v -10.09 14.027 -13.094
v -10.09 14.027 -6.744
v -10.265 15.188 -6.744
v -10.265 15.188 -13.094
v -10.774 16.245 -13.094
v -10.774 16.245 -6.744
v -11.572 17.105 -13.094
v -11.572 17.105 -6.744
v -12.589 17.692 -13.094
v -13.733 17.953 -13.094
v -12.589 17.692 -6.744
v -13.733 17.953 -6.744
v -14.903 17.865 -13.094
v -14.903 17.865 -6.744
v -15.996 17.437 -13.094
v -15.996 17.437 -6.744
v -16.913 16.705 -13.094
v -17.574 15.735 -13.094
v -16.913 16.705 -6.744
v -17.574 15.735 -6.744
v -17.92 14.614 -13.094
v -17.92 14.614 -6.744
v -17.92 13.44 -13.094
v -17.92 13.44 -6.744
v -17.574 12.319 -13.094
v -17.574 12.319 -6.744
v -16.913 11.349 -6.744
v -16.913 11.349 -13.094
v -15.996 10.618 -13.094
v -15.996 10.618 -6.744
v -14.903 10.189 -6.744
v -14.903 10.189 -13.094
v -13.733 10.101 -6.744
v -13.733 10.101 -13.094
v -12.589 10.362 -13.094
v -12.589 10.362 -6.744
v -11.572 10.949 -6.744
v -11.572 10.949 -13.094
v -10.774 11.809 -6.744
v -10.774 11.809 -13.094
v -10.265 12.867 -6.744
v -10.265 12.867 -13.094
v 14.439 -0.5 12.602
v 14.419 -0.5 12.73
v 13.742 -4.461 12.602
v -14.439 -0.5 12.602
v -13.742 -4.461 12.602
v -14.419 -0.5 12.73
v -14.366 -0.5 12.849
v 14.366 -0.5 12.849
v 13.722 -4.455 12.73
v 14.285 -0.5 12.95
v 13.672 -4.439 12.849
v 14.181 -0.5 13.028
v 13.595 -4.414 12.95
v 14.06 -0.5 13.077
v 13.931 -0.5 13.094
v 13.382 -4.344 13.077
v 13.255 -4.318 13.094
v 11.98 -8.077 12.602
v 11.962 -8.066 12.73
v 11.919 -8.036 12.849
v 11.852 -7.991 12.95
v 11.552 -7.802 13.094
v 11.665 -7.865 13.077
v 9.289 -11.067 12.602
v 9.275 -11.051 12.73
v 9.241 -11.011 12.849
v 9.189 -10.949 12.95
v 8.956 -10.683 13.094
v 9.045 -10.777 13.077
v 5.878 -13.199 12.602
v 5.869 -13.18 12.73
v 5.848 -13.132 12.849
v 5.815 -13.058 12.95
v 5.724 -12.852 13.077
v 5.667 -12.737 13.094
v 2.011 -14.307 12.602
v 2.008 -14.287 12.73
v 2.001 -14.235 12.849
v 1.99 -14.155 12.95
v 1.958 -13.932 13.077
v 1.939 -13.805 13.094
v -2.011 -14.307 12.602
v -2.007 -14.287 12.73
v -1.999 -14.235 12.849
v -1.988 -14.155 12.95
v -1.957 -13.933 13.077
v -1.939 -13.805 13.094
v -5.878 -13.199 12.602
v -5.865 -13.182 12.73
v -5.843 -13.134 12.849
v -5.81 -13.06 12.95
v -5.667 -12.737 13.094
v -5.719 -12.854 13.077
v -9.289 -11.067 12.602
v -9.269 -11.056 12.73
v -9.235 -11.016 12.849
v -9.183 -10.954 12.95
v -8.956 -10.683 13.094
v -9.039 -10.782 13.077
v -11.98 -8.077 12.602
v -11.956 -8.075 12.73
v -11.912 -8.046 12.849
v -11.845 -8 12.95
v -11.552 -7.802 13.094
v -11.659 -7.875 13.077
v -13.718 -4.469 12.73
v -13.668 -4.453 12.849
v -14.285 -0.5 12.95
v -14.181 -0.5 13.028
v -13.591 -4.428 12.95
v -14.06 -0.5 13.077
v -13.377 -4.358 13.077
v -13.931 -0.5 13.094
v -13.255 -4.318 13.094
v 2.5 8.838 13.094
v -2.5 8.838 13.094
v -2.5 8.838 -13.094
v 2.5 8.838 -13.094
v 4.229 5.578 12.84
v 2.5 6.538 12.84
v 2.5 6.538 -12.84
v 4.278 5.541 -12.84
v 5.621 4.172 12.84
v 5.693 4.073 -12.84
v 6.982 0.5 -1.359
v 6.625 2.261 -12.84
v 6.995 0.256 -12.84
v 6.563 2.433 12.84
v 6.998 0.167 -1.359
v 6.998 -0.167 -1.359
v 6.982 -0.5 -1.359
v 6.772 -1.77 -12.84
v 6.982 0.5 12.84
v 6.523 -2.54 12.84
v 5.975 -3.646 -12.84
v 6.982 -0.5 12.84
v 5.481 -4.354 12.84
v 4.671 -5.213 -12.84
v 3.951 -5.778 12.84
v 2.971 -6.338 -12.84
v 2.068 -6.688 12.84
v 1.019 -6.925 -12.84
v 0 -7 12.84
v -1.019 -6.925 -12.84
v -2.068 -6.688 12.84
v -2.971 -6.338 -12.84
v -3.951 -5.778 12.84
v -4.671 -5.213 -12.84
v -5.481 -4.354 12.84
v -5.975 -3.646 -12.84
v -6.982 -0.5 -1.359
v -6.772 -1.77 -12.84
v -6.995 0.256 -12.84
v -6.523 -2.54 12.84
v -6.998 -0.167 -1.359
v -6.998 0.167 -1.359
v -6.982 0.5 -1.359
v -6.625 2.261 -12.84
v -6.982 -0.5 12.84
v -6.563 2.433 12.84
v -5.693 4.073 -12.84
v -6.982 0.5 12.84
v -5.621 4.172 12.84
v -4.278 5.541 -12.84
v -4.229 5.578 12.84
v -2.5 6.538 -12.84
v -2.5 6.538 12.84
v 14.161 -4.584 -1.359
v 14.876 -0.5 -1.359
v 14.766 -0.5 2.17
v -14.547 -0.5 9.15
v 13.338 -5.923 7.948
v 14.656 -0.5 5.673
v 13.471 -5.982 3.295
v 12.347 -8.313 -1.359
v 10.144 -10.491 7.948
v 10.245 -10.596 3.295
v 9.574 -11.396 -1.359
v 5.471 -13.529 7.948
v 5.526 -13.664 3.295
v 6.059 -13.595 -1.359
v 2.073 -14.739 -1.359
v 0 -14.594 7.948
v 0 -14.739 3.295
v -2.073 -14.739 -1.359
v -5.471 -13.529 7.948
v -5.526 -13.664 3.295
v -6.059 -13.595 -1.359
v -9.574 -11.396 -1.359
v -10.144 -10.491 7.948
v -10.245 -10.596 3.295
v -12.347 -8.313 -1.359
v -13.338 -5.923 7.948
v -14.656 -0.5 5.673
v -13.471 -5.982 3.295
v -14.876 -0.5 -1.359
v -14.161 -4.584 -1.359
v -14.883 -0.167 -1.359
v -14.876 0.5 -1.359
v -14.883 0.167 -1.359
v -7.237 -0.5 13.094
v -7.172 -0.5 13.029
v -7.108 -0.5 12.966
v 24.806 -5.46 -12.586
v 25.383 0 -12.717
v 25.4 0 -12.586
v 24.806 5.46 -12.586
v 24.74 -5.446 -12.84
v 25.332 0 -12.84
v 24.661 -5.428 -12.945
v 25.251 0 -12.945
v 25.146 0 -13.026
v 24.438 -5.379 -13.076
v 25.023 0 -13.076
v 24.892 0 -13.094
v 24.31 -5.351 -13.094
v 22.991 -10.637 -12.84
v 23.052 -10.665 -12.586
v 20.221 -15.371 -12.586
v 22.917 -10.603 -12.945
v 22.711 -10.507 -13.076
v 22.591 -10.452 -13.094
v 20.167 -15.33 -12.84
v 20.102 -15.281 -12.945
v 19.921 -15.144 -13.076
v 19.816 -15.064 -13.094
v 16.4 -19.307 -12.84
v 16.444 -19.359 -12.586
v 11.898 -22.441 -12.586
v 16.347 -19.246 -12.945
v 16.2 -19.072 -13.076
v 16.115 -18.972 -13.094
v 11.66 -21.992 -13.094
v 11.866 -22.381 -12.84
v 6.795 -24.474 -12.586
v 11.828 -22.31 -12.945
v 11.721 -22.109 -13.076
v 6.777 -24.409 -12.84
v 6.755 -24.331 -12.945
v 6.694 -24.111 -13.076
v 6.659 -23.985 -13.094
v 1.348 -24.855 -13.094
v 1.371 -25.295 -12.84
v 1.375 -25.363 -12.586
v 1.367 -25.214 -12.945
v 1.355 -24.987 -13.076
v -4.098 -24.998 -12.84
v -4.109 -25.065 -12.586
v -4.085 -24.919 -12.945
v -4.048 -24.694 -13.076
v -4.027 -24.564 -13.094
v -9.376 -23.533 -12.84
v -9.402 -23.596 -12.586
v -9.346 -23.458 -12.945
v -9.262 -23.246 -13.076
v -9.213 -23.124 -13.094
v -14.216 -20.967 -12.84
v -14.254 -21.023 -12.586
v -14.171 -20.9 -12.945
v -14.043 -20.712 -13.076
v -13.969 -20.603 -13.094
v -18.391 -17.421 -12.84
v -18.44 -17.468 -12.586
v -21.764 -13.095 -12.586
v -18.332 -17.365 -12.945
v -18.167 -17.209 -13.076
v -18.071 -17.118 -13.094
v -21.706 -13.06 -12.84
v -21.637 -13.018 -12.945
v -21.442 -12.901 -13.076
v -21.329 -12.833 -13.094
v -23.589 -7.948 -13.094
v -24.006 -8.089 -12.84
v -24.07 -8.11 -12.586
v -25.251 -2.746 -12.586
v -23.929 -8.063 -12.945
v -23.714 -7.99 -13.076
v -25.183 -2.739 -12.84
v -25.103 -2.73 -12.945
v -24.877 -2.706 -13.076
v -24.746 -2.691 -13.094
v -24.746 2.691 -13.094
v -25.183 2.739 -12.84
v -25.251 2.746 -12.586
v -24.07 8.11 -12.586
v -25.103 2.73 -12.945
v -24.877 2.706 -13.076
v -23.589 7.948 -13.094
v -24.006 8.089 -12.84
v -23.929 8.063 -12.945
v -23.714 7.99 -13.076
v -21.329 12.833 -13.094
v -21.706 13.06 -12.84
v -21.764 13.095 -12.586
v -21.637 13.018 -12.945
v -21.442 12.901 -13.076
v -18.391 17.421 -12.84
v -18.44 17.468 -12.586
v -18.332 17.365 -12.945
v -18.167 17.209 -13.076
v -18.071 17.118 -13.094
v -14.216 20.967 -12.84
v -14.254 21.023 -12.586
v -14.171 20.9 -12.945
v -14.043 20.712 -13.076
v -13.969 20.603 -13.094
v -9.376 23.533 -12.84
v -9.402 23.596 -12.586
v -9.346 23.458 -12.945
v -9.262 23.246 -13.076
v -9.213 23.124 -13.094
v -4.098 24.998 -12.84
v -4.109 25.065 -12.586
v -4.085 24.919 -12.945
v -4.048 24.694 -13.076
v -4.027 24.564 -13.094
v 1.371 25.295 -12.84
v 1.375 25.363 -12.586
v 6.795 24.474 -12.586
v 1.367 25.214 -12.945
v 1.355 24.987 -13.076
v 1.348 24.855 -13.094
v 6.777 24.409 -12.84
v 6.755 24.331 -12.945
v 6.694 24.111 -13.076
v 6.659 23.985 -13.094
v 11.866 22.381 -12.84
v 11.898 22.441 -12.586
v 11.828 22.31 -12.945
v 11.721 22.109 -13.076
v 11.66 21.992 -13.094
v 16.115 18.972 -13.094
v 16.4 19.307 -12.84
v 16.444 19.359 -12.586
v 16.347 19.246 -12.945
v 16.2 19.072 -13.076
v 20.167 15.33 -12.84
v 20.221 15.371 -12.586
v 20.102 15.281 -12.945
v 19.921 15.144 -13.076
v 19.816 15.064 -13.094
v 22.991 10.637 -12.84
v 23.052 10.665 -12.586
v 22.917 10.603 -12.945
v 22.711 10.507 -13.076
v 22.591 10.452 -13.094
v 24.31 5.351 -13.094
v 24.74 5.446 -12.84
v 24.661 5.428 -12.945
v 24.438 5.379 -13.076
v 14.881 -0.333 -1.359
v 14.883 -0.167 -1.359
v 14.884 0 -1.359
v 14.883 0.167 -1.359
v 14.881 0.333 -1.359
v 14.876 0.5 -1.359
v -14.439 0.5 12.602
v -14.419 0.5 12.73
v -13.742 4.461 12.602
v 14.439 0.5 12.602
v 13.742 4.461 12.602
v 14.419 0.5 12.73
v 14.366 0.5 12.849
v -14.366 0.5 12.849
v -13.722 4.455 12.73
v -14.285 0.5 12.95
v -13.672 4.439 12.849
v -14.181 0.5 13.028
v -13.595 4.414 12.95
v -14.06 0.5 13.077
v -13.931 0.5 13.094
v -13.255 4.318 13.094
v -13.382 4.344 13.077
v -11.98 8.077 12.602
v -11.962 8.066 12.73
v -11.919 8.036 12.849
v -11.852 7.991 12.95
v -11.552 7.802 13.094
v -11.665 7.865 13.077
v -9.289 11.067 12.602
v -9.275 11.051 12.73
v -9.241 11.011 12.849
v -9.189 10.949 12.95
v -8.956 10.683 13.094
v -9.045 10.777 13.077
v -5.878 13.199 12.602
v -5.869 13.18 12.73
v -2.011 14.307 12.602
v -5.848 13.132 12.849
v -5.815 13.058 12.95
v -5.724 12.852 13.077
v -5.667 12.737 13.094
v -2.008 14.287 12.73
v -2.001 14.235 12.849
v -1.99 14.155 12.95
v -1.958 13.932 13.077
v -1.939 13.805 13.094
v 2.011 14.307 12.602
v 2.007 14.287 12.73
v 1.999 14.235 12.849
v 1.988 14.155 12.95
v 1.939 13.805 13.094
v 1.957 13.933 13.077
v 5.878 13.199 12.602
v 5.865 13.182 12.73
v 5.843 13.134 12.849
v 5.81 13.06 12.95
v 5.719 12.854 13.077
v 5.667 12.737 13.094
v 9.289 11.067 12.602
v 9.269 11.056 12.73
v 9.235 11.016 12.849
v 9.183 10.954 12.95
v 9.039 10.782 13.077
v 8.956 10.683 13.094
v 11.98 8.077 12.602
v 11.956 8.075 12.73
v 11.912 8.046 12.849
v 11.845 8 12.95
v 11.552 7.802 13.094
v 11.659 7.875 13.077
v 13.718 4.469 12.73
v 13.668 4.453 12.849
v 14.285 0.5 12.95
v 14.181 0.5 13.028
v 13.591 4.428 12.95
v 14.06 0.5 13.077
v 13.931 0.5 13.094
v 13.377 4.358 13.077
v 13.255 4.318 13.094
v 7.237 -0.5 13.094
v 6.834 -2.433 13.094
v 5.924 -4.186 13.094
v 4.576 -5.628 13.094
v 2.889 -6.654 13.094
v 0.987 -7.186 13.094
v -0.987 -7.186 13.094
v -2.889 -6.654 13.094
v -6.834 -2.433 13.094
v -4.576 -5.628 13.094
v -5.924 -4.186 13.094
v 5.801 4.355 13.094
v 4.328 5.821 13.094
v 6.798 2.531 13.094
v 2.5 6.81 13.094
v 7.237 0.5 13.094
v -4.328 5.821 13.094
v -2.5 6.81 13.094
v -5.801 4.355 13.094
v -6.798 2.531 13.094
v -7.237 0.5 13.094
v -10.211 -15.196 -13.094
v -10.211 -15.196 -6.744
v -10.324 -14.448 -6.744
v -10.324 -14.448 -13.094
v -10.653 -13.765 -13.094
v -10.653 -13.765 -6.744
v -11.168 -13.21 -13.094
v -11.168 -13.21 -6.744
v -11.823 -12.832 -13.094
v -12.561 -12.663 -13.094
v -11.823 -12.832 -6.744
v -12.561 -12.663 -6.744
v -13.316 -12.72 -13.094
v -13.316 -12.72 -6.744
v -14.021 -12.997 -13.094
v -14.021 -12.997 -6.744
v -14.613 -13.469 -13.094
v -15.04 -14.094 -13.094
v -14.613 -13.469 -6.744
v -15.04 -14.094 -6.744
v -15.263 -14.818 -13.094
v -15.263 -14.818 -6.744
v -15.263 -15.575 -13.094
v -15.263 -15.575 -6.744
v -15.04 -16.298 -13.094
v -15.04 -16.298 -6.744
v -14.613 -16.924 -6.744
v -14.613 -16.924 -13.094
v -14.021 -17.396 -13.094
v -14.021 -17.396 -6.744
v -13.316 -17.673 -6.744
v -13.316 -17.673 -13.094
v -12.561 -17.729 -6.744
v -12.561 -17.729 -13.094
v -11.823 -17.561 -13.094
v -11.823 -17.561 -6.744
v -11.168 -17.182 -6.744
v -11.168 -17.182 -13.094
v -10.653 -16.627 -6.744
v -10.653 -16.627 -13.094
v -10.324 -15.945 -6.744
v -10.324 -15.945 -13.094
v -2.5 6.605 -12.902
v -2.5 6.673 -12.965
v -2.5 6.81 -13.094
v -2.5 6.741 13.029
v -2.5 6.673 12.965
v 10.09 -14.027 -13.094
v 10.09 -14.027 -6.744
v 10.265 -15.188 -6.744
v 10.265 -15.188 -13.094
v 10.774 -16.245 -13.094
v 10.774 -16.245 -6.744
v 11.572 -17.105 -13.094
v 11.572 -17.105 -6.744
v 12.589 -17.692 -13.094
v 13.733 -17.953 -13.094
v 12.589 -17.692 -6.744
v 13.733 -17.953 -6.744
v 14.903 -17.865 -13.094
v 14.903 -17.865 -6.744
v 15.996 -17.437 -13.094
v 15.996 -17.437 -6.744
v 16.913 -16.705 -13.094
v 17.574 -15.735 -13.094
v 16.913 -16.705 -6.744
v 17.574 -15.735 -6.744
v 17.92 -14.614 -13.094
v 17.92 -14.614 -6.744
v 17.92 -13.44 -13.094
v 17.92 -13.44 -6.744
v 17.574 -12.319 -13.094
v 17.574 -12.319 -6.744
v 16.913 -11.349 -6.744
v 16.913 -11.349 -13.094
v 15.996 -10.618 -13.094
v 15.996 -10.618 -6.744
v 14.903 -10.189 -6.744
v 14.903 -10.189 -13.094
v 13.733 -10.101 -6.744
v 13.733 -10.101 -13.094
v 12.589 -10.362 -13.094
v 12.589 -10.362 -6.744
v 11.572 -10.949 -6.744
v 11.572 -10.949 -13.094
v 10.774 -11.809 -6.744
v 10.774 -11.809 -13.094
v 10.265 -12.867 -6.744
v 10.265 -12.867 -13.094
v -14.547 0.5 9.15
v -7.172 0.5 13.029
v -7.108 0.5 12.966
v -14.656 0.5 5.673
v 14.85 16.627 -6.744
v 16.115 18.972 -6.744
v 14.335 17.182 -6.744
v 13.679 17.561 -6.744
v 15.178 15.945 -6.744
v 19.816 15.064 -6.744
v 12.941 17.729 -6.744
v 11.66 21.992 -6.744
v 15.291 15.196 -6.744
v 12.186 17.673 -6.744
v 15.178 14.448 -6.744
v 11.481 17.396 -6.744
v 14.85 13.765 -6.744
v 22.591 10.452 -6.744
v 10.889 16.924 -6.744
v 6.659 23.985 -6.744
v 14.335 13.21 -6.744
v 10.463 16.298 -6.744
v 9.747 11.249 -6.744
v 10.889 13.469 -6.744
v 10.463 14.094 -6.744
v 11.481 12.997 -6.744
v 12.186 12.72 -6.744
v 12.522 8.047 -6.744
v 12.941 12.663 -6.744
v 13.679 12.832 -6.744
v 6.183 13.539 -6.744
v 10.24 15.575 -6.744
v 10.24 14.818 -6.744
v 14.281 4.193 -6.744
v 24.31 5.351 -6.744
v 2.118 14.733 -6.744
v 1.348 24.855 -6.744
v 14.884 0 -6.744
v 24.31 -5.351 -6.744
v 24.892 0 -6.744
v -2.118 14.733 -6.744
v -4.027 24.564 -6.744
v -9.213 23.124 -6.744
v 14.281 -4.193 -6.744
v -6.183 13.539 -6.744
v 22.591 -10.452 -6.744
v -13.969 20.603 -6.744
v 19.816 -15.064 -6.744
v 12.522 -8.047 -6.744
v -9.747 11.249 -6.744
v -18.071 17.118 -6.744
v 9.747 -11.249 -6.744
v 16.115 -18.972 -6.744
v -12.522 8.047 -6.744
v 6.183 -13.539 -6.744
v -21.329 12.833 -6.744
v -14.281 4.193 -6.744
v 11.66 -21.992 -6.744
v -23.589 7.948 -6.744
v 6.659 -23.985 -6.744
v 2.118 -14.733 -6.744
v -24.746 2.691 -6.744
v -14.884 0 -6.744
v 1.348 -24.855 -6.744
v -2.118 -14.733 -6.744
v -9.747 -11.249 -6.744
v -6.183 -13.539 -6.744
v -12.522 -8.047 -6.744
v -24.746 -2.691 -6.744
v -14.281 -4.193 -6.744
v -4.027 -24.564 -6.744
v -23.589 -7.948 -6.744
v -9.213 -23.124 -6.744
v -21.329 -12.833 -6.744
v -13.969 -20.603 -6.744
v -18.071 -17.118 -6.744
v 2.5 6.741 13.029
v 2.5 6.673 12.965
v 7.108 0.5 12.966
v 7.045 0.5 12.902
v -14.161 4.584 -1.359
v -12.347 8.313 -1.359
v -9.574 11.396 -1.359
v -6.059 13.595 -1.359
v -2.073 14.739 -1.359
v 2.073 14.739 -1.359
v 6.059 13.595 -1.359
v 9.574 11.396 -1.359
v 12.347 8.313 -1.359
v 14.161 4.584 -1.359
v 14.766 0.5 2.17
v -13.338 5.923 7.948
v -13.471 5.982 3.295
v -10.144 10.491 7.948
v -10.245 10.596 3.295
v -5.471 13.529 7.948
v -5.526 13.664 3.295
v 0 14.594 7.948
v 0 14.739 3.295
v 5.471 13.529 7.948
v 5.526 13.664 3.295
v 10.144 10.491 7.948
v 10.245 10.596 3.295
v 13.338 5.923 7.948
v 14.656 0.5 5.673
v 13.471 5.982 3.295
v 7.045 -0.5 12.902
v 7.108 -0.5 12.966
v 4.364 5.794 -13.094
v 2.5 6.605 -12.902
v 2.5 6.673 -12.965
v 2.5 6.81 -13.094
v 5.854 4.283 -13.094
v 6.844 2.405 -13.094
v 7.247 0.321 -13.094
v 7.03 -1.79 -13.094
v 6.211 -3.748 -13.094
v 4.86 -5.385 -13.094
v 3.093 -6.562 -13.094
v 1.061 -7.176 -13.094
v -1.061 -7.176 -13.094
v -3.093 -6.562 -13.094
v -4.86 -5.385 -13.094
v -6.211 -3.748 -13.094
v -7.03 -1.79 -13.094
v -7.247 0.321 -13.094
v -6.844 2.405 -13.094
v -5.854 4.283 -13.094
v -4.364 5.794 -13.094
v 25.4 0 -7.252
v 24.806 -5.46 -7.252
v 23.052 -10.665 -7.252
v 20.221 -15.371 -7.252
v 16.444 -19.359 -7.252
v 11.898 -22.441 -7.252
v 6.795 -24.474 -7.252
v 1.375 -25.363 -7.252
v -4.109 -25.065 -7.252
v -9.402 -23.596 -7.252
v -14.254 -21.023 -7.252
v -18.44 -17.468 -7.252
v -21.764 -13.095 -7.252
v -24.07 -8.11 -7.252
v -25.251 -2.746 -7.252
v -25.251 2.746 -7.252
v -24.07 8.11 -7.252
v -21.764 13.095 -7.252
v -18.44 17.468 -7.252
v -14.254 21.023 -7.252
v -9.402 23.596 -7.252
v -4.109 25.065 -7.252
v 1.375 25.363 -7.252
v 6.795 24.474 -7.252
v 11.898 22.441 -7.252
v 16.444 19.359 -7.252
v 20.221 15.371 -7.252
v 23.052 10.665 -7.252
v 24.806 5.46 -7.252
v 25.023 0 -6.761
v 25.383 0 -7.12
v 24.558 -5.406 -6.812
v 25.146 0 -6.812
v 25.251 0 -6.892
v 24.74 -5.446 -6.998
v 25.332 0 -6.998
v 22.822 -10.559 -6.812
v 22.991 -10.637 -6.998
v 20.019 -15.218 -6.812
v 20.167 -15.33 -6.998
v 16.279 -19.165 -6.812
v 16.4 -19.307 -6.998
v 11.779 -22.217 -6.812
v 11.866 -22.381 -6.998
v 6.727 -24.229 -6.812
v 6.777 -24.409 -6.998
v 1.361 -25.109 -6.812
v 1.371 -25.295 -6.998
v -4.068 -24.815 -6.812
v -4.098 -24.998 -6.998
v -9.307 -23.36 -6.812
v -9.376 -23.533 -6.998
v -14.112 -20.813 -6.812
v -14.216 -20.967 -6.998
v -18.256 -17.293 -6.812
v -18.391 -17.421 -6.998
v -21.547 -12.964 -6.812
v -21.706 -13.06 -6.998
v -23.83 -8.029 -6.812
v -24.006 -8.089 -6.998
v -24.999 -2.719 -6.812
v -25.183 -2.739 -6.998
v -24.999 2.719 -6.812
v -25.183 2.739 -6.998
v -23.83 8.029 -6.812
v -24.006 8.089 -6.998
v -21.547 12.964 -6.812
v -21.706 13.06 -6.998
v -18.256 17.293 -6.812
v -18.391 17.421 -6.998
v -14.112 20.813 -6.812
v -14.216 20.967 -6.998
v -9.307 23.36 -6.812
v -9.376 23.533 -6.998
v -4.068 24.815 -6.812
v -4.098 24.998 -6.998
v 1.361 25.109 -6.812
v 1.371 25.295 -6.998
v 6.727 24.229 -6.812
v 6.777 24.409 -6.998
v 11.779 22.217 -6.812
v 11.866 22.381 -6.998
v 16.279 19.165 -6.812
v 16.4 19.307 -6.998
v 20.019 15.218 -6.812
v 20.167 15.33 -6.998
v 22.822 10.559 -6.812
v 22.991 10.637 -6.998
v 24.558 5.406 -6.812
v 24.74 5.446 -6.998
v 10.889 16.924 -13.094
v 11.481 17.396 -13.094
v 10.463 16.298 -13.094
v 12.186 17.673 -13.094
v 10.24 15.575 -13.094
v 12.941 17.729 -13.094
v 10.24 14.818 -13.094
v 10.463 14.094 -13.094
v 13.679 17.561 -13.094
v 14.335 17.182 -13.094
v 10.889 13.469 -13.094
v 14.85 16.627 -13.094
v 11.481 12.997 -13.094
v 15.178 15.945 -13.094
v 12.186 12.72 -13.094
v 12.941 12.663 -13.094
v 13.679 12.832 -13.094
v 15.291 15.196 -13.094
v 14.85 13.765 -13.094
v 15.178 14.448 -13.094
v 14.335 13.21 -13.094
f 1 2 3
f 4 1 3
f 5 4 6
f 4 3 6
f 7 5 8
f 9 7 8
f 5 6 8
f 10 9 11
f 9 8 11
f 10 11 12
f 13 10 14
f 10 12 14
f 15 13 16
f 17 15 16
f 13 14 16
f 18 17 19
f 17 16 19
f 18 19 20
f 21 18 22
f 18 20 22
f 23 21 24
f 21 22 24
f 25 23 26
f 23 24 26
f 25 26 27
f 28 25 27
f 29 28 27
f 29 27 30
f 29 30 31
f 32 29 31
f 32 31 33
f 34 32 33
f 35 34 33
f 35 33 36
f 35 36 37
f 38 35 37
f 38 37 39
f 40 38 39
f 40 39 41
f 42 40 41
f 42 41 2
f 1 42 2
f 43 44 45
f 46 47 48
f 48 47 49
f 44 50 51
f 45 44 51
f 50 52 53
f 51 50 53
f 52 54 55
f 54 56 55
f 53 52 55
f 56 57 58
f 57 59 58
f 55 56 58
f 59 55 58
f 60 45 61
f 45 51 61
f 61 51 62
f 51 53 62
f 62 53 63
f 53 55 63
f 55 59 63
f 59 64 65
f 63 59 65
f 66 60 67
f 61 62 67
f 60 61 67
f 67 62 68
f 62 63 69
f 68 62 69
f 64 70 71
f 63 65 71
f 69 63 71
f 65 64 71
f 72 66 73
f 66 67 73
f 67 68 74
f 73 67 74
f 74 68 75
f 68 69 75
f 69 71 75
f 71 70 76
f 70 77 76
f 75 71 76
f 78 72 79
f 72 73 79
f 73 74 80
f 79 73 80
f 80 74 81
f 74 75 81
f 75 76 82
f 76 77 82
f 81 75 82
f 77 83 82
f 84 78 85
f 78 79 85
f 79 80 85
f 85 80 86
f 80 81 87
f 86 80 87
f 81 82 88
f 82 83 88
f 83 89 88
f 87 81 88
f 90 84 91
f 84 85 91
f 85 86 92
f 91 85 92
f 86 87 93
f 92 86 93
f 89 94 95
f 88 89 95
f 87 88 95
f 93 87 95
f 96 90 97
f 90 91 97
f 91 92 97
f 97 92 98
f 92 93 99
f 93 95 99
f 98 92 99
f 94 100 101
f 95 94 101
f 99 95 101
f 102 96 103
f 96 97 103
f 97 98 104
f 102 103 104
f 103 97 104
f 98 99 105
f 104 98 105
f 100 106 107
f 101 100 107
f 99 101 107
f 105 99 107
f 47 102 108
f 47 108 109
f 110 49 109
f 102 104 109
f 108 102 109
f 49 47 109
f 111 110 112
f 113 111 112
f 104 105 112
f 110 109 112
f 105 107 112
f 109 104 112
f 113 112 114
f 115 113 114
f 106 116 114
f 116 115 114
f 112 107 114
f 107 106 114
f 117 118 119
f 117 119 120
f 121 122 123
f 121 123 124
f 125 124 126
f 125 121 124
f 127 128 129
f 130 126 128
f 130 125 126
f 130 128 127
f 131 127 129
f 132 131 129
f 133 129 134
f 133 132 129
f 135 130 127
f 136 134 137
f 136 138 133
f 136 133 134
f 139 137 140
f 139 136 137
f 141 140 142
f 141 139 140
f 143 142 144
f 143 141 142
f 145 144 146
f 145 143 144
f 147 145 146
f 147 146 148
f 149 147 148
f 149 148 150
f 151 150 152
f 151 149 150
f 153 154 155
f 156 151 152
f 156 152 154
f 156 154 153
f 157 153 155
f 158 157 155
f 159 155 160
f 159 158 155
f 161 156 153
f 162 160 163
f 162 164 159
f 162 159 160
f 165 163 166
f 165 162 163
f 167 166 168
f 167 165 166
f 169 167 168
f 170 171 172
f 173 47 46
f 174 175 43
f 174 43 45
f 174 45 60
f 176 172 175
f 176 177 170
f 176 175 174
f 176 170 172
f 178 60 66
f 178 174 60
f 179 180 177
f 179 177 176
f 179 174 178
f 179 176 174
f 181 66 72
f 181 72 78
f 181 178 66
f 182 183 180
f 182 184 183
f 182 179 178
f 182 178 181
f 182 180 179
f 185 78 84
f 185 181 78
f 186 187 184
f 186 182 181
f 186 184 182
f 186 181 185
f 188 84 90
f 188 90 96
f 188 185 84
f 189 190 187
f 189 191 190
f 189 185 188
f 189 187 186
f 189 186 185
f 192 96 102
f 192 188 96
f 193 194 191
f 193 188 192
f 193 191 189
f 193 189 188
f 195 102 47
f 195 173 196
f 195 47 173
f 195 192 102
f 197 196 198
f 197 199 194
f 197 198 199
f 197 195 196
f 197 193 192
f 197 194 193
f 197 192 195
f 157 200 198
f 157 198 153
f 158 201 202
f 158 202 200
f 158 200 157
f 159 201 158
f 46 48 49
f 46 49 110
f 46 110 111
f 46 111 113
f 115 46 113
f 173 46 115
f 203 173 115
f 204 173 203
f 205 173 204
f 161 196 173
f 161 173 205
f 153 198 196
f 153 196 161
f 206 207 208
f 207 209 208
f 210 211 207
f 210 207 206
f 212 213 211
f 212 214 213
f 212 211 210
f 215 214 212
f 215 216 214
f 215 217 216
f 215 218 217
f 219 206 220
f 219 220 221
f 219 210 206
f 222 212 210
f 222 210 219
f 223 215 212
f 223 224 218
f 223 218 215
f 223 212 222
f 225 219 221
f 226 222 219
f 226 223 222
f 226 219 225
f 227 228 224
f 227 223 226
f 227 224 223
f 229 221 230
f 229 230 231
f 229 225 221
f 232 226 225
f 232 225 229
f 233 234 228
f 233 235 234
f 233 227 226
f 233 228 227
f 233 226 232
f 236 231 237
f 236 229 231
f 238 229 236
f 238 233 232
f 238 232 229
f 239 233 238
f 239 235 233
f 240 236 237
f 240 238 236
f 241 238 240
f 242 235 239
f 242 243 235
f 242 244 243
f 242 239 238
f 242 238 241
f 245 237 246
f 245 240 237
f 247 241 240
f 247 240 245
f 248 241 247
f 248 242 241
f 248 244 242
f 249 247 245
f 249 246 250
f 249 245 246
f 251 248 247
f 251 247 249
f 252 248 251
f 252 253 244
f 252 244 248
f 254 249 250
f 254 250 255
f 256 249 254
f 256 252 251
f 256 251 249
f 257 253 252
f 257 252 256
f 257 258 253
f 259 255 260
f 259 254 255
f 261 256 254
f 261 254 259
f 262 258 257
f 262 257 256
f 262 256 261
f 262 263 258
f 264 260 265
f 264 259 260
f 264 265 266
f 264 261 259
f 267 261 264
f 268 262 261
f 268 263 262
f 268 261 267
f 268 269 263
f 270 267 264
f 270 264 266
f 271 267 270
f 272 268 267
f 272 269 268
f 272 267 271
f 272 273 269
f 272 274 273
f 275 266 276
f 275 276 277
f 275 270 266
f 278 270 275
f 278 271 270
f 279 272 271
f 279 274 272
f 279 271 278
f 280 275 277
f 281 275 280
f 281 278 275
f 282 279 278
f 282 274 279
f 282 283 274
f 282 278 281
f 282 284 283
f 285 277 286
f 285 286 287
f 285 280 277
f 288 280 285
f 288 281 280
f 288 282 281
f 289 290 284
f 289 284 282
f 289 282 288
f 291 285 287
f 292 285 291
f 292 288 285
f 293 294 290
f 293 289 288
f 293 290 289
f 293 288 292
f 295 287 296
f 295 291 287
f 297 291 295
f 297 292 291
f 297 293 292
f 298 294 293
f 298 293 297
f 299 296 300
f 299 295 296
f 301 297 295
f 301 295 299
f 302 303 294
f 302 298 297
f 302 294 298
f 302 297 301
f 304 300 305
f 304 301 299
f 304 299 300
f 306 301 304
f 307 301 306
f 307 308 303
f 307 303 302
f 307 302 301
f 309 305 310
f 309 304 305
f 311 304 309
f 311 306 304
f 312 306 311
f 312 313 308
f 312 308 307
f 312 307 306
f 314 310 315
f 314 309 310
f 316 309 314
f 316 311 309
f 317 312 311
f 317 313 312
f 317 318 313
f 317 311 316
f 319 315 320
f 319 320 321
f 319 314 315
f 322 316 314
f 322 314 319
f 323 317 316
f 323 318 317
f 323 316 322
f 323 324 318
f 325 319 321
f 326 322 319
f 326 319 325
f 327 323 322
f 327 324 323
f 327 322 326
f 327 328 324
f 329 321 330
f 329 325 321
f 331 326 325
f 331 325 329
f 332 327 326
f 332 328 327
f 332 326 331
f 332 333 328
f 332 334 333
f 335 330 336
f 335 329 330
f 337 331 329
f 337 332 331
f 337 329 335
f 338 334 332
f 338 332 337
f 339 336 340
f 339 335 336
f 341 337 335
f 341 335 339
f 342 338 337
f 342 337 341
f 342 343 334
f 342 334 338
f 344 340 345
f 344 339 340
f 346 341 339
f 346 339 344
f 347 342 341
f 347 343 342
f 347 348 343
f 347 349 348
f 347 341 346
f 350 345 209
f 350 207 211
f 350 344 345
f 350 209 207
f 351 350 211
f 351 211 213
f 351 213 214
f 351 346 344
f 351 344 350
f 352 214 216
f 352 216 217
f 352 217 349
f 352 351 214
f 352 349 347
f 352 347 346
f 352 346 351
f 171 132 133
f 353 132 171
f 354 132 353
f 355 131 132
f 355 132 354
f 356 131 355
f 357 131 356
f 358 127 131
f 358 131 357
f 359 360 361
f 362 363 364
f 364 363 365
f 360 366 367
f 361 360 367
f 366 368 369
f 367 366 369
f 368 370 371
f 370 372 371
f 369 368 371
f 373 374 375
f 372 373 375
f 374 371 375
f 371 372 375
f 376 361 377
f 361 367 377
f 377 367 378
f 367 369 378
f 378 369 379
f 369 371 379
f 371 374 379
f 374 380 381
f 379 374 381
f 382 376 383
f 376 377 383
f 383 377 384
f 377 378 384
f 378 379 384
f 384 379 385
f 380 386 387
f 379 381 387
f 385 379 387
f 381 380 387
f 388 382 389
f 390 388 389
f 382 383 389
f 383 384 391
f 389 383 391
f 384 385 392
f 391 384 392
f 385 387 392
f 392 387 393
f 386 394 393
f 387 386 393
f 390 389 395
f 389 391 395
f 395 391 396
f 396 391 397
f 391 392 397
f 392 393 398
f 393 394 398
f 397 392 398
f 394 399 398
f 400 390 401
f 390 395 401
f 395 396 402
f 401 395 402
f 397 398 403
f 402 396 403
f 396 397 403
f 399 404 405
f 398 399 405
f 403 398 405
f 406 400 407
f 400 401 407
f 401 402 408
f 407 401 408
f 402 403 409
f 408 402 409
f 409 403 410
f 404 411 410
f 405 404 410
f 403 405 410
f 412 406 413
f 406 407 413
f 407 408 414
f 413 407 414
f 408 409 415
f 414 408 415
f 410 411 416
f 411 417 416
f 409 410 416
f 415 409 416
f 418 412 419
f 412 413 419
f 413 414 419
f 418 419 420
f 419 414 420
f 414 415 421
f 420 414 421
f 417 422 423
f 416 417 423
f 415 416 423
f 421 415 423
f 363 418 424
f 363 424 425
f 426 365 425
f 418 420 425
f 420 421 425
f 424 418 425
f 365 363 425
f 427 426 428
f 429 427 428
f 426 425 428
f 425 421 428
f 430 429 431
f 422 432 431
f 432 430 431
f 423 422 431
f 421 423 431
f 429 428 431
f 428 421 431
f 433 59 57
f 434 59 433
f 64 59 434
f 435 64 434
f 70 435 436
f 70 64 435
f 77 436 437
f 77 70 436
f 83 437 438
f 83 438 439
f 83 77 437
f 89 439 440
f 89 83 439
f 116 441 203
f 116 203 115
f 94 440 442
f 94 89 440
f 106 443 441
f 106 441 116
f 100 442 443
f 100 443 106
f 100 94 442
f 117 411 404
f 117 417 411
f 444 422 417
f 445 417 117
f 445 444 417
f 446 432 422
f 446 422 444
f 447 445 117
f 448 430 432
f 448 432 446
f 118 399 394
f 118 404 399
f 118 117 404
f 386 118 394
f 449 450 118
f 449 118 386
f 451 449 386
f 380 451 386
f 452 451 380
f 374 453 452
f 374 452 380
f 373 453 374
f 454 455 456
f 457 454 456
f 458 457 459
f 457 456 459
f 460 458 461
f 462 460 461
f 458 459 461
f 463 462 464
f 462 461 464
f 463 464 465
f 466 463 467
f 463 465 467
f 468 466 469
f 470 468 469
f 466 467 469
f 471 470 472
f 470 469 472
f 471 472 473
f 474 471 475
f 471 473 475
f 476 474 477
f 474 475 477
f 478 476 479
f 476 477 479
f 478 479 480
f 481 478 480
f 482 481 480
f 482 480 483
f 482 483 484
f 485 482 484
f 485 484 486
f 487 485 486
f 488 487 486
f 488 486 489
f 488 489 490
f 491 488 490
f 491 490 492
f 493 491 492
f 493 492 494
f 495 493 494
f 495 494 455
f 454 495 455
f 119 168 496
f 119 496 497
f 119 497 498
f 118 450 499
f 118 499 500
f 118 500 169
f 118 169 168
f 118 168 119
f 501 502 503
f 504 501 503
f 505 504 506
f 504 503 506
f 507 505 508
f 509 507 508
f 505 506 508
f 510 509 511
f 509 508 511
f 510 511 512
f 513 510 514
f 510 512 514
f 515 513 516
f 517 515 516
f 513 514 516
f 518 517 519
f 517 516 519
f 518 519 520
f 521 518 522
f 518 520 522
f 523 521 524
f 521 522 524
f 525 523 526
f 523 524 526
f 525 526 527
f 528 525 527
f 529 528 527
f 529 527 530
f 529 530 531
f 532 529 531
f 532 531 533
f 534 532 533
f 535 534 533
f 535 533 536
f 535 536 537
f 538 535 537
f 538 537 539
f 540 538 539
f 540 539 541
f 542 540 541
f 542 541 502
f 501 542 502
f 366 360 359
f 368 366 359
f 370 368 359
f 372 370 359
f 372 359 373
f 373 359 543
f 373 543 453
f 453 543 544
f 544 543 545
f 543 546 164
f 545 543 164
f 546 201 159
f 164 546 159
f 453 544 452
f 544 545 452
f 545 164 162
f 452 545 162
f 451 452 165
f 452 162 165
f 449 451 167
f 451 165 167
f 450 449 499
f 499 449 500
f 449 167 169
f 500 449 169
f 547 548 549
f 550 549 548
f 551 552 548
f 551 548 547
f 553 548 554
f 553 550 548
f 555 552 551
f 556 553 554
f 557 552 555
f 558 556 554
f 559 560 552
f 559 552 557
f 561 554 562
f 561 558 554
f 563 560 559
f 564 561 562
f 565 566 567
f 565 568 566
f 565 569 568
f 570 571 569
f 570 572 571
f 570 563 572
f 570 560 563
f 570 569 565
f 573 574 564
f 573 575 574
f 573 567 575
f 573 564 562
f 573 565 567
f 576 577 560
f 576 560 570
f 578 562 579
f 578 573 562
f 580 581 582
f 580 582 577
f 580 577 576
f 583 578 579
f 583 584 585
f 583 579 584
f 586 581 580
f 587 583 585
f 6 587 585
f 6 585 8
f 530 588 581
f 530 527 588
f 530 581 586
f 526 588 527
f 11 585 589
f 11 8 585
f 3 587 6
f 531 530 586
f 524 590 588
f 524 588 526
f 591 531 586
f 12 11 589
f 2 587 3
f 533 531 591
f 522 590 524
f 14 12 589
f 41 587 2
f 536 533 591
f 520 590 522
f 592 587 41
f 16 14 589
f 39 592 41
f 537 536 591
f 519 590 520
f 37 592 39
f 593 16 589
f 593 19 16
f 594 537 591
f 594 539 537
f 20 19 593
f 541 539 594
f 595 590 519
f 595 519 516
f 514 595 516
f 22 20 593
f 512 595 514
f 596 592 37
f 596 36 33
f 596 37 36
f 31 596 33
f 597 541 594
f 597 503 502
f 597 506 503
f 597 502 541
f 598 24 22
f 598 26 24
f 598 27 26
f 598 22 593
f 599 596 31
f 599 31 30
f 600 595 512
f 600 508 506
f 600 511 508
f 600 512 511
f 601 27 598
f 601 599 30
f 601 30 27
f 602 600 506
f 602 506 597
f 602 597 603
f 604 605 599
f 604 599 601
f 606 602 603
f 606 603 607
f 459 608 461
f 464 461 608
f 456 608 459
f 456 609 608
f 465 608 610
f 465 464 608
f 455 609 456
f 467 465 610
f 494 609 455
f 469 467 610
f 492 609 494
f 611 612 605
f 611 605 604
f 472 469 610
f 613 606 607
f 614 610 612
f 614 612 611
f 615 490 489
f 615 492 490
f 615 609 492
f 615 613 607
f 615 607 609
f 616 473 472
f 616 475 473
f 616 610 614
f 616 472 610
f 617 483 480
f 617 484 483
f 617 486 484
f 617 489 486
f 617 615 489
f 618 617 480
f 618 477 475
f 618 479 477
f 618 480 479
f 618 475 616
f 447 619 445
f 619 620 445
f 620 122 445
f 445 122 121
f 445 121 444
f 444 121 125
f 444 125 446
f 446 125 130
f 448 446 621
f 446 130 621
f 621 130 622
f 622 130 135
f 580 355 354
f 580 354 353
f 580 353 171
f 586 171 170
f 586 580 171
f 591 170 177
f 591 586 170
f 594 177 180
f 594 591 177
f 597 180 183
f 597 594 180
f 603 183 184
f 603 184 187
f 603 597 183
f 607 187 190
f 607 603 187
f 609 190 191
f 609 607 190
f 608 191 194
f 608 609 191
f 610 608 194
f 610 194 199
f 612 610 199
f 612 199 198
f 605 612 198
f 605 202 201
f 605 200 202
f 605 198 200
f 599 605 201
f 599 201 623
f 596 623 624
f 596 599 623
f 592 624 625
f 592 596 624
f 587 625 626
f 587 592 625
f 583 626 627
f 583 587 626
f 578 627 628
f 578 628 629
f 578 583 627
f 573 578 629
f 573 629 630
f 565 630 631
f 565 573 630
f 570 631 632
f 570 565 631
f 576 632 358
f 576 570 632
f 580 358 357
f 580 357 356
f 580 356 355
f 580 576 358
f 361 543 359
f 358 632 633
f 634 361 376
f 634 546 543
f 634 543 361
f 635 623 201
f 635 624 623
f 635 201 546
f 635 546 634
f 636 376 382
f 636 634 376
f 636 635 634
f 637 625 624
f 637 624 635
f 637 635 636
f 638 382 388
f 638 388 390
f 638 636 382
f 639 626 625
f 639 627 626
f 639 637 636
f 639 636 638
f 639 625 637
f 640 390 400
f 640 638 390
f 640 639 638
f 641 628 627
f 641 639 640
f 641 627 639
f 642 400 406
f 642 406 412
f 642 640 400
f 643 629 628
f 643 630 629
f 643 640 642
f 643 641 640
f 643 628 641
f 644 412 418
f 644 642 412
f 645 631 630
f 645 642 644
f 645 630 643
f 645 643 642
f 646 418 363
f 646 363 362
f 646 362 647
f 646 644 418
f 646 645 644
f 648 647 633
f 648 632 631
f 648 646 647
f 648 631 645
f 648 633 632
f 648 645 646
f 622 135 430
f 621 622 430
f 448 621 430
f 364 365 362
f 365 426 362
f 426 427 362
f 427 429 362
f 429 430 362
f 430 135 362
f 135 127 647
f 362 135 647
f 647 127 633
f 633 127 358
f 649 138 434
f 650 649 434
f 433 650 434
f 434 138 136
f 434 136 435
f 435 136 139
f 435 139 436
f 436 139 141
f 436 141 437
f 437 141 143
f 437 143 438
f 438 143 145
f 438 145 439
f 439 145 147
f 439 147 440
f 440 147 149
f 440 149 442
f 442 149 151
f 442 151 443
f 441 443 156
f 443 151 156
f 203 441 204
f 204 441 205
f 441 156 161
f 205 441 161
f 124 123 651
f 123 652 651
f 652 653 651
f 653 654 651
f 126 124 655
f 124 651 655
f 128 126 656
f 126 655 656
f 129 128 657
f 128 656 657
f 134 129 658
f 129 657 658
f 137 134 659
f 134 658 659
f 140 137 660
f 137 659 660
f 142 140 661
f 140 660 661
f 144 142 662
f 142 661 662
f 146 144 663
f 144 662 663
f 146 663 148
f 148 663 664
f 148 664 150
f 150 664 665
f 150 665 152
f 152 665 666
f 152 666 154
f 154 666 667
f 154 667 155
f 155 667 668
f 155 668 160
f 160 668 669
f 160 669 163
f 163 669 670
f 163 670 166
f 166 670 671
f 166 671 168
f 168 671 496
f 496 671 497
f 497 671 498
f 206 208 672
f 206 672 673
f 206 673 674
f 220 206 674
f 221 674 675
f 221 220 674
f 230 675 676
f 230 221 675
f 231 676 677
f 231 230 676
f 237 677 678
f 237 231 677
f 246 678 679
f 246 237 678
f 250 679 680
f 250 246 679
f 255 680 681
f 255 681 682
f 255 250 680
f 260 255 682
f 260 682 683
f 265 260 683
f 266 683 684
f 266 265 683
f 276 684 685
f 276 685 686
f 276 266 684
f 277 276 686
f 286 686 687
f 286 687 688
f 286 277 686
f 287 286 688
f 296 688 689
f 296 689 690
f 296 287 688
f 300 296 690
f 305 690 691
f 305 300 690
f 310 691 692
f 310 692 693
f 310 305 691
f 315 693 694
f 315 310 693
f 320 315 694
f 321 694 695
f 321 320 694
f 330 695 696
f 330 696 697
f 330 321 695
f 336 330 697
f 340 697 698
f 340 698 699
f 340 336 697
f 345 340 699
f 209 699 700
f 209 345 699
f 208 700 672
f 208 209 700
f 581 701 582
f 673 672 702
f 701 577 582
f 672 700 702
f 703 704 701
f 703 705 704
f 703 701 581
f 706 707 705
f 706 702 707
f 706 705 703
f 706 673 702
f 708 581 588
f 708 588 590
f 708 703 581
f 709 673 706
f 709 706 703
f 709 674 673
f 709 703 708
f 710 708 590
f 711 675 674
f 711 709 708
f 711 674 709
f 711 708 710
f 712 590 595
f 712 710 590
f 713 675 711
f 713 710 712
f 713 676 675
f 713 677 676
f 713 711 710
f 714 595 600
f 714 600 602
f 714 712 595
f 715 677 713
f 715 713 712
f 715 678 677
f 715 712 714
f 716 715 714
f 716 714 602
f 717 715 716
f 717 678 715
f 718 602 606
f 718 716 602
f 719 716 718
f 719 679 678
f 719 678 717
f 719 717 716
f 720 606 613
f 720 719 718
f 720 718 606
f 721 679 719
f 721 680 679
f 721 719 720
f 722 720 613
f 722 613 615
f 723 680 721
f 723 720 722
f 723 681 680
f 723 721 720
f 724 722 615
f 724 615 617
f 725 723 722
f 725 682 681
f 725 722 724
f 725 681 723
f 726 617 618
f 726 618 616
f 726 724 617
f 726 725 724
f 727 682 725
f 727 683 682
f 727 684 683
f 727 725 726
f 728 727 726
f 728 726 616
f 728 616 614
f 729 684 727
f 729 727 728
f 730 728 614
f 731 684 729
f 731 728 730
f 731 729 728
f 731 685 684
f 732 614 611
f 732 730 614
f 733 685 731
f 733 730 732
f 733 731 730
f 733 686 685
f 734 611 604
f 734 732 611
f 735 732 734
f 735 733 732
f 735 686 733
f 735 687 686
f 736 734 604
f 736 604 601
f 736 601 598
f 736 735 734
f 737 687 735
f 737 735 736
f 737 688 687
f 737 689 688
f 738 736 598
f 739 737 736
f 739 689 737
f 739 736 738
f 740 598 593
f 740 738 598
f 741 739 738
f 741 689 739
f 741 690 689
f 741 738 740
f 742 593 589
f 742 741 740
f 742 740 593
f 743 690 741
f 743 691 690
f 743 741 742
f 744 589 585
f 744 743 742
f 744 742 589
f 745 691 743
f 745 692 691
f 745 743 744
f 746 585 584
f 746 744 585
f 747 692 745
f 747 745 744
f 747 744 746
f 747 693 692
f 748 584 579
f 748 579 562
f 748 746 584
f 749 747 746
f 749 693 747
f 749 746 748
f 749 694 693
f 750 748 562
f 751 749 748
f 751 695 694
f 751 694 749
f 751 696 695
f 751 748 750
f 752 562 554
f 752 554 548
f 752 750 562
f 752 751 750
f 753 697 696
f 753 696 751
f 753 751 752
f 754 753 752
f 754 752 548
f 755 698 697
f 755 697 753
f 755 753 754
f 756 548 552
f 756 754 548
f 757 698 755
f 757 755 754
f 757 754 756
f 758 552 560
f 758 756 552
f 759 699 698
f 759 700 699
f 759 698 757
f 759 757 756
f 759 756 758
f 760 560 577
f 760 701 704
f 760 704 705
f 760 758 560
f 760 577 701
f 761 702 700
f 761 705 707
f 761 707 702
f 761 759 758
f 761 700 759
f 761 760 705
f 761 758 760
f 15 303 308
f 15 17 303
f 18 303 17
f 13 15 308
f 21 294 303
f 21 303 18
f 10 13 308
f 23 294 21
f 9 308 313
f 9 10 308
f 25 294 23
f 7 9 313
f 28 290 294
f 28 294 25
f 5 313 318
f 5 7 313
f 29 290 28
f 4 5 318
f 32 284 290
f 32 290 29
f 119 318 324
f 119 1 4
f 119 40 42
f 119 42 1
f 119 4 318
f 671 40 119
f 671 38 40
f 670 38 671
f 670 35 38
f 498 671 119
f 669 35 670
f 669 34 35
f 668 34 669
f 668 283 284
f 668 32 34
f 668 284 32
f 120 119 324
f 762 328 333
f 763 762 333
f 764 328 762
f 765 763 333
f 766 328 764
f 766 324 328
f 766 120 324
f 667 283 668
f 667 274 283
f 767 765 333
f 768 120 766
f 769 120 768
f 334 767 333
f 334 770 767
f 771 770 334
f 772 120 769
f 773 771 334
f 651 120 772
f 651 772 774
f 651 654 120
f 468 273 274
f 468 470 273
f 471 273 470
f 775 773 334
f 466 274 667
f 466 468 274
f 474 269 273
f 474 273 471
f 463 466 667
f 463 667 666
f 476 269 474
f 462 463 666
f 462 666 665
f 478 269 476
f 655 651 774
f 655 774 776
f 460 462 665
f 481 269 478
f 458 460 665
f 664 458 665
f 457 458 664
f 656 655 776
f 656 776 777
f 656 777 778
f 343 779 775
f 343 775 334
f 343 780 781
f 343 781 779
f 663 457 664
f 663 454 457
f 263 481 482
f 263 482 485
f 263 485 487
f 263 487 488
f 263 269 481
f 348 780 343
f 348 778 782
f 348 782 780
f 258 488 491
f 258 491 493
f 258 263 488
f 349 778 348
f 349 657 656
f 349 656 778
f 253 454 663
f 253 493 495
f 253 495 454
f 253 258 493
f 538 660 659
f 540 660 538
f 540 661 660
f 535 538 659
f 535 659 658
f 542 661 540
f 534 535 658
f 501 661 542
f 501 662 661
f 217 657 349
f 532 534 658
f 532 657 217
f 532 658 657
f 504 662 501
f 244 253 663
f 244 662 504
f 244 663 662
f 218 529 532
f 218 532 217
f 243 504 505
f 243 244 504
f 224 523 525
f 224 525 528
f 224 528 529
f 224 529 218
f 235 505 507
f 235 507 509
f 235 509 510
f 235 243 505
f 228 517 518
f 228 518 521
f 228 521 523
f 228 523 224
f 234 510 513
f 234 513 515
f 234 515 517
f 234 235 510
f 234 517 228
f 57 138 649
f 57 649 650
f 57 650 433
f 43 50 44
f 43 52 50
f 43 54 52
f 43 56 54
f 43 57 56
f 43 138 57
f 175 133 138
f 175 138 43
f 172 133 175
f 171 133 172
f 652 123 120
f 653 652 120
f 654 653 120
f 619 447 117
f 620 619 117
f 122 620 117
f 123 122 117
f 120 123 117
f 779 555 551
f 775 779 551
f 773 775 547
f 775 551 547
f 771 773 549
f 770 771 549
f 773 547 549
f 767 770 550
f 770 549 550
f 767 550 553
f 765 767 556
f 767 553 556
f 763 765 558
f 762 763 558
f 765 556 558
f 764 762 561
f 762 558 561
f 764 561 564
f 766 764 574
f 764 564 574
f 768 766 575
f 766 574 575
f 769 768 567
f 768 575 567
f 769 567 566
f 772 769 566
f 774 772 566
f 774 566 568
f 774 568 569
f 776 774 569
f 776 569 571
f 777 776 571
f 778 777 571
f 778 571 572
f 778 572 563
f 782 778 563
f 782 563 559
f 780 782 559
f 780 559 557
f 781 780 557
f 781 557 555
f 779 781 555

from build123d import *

# Parameters (mm, degrees)
FILLET1_R                        = 0.508
FILLET2_R                        = 0.508
CHAMFER1_SIZE                    = 0.254
SKETCH19_R                       = 2.54
THREADED_HOLES_1_DEPTH           = 42.03464937
SKETCH22_R                       = 3.937
CLEARANCE_HOLES_DEPTH            = 42.03464937
CLEARANCE_HOLES_CIRPATTERN_COUNT = 2
SKETCH23_W                       = 5
SKETCH23_H                       = 2.3
CUT_EXTRUDE1_DEPTH               = 45.453345531
CUT_EXTRUDE2_START               = -14.4526
SKETCH24_W                       = 29.7688
SKETCH24_H                       = 1
CUT_EXTRUDE2_DEPTH               = 14.4526


with BuildPart() as part:
    # Sketch1 → Revolve1 (revolve)
    with BuildSketch(Plane(origin=(0, 0, 0), x_dir=(0, 0, -1), z_dir=(1, 0, 0)), mode=Mode.PRIVATE) as revolve1_sk:
        Polygon((-13.0937, 7), (-13.0937, 14.432756404), (1.3589, 14.8844), (6.7437, 14.8844), (6.7437, 25.4), (13.0937, 25.4), (13.0937, 7), align=None)
    revolve(revolve1_sk.sketch.rotate(Axis((0, 0, 13.0937), (0, 0, -1)), 90), axis=Axis((0, 0, 13.0937), (0, 0, -1)))

    # Fillet1
    fillet1_edges = [part.edges().sort_by_distance(p)[0] for p in [
        (-25.4, 0, -13.0937),
        (-25.4, 0, -6.7437),
    ]]
    fillet(fillet1_edges, radius=FILLET1_R)

    # Fillet2
    fillet2_edges = [part.edges().sort_by_distance(p)[0] for p in [
        (-14.432756404, 0, 13.0937),
    ]]
    fillet(fillet2_edges, radius=FILLET2_R)

    # Chamfer1
    chamfer1_edges = [part.edges().sort_by_distance(p)[0] for p in [
        (-7, 0, -13.0937),
        (-7, 0, 13.0937),
    ]]
    chamfer(chamfer1_edges, length=CHAMFER1_SIZE)

    # Sketch19 → Threaded holes 1 (cut, through all)
    with BuildSketch(Plane.XY.offset(-6.7437)):
        with Locations((12.751234928, 15.196330036)):
            Circle(SKETCH19_R)
        with Locations((-12.751234928, -15.196330036)):
            Circle(SKETCH19_R)
    extrude(amount=-THREADED_HOLES_1_DEPTH, mode=Mode.SUBTRACT)

    # Sketch22 → Clearance holes (cut, through all)
    with BuildSketch(Plane.XY.offset(-6.7437)):
        with Locations((-14.027160061, 14.027160061)):
            Circle(SKETCH22_R)
    clearance_holes = extrude(amount=-CLEARANCE_HOLES_DEPTH, mode=Mode.SUBTRACT)

    # Clearance holes CirPattern: Clearance holes ×2 about axis
    clearance_holes_cirpattern_axis = Axis((0, 0, 0), (0, 0, 1))
    for i in range(1, CLEARANCE_HOLES_CIRPATTERN_COUNT):
        add(clearance_holes.rotate(clearance_holes_cirpattern_axis, i * 360 / CLEARANCE_HOLES_CIRPATTERN_COUNT), mode=Mode.SUBTRACT)

    # Sketch23 → Cut-Extrude1 (cut, through all)
    with BuildSketch(Plane.XY.offset(13.0937)):
        with Locations((0, 7.688348415)):
            Rectangle(SKETCH23_W, SKETCH23_H)
    extrude(amount=-CUT_EXTRUDE1_DEPTH, mode=Mode.SUBTRACT)

    # Sketch24 → Cut-Extrude2 (cut)
    with BuildSketch(Plane.XY.offset(13.0937).offset(CUT_EXTRUDE2_START)):
        Rectangle(SKETCH24_W, SKETCH24_H)
    extrude(amount=CUT_EXTRUDE2_DEPTH, mode=Mode.SUBTRACT)


solid = part.part
